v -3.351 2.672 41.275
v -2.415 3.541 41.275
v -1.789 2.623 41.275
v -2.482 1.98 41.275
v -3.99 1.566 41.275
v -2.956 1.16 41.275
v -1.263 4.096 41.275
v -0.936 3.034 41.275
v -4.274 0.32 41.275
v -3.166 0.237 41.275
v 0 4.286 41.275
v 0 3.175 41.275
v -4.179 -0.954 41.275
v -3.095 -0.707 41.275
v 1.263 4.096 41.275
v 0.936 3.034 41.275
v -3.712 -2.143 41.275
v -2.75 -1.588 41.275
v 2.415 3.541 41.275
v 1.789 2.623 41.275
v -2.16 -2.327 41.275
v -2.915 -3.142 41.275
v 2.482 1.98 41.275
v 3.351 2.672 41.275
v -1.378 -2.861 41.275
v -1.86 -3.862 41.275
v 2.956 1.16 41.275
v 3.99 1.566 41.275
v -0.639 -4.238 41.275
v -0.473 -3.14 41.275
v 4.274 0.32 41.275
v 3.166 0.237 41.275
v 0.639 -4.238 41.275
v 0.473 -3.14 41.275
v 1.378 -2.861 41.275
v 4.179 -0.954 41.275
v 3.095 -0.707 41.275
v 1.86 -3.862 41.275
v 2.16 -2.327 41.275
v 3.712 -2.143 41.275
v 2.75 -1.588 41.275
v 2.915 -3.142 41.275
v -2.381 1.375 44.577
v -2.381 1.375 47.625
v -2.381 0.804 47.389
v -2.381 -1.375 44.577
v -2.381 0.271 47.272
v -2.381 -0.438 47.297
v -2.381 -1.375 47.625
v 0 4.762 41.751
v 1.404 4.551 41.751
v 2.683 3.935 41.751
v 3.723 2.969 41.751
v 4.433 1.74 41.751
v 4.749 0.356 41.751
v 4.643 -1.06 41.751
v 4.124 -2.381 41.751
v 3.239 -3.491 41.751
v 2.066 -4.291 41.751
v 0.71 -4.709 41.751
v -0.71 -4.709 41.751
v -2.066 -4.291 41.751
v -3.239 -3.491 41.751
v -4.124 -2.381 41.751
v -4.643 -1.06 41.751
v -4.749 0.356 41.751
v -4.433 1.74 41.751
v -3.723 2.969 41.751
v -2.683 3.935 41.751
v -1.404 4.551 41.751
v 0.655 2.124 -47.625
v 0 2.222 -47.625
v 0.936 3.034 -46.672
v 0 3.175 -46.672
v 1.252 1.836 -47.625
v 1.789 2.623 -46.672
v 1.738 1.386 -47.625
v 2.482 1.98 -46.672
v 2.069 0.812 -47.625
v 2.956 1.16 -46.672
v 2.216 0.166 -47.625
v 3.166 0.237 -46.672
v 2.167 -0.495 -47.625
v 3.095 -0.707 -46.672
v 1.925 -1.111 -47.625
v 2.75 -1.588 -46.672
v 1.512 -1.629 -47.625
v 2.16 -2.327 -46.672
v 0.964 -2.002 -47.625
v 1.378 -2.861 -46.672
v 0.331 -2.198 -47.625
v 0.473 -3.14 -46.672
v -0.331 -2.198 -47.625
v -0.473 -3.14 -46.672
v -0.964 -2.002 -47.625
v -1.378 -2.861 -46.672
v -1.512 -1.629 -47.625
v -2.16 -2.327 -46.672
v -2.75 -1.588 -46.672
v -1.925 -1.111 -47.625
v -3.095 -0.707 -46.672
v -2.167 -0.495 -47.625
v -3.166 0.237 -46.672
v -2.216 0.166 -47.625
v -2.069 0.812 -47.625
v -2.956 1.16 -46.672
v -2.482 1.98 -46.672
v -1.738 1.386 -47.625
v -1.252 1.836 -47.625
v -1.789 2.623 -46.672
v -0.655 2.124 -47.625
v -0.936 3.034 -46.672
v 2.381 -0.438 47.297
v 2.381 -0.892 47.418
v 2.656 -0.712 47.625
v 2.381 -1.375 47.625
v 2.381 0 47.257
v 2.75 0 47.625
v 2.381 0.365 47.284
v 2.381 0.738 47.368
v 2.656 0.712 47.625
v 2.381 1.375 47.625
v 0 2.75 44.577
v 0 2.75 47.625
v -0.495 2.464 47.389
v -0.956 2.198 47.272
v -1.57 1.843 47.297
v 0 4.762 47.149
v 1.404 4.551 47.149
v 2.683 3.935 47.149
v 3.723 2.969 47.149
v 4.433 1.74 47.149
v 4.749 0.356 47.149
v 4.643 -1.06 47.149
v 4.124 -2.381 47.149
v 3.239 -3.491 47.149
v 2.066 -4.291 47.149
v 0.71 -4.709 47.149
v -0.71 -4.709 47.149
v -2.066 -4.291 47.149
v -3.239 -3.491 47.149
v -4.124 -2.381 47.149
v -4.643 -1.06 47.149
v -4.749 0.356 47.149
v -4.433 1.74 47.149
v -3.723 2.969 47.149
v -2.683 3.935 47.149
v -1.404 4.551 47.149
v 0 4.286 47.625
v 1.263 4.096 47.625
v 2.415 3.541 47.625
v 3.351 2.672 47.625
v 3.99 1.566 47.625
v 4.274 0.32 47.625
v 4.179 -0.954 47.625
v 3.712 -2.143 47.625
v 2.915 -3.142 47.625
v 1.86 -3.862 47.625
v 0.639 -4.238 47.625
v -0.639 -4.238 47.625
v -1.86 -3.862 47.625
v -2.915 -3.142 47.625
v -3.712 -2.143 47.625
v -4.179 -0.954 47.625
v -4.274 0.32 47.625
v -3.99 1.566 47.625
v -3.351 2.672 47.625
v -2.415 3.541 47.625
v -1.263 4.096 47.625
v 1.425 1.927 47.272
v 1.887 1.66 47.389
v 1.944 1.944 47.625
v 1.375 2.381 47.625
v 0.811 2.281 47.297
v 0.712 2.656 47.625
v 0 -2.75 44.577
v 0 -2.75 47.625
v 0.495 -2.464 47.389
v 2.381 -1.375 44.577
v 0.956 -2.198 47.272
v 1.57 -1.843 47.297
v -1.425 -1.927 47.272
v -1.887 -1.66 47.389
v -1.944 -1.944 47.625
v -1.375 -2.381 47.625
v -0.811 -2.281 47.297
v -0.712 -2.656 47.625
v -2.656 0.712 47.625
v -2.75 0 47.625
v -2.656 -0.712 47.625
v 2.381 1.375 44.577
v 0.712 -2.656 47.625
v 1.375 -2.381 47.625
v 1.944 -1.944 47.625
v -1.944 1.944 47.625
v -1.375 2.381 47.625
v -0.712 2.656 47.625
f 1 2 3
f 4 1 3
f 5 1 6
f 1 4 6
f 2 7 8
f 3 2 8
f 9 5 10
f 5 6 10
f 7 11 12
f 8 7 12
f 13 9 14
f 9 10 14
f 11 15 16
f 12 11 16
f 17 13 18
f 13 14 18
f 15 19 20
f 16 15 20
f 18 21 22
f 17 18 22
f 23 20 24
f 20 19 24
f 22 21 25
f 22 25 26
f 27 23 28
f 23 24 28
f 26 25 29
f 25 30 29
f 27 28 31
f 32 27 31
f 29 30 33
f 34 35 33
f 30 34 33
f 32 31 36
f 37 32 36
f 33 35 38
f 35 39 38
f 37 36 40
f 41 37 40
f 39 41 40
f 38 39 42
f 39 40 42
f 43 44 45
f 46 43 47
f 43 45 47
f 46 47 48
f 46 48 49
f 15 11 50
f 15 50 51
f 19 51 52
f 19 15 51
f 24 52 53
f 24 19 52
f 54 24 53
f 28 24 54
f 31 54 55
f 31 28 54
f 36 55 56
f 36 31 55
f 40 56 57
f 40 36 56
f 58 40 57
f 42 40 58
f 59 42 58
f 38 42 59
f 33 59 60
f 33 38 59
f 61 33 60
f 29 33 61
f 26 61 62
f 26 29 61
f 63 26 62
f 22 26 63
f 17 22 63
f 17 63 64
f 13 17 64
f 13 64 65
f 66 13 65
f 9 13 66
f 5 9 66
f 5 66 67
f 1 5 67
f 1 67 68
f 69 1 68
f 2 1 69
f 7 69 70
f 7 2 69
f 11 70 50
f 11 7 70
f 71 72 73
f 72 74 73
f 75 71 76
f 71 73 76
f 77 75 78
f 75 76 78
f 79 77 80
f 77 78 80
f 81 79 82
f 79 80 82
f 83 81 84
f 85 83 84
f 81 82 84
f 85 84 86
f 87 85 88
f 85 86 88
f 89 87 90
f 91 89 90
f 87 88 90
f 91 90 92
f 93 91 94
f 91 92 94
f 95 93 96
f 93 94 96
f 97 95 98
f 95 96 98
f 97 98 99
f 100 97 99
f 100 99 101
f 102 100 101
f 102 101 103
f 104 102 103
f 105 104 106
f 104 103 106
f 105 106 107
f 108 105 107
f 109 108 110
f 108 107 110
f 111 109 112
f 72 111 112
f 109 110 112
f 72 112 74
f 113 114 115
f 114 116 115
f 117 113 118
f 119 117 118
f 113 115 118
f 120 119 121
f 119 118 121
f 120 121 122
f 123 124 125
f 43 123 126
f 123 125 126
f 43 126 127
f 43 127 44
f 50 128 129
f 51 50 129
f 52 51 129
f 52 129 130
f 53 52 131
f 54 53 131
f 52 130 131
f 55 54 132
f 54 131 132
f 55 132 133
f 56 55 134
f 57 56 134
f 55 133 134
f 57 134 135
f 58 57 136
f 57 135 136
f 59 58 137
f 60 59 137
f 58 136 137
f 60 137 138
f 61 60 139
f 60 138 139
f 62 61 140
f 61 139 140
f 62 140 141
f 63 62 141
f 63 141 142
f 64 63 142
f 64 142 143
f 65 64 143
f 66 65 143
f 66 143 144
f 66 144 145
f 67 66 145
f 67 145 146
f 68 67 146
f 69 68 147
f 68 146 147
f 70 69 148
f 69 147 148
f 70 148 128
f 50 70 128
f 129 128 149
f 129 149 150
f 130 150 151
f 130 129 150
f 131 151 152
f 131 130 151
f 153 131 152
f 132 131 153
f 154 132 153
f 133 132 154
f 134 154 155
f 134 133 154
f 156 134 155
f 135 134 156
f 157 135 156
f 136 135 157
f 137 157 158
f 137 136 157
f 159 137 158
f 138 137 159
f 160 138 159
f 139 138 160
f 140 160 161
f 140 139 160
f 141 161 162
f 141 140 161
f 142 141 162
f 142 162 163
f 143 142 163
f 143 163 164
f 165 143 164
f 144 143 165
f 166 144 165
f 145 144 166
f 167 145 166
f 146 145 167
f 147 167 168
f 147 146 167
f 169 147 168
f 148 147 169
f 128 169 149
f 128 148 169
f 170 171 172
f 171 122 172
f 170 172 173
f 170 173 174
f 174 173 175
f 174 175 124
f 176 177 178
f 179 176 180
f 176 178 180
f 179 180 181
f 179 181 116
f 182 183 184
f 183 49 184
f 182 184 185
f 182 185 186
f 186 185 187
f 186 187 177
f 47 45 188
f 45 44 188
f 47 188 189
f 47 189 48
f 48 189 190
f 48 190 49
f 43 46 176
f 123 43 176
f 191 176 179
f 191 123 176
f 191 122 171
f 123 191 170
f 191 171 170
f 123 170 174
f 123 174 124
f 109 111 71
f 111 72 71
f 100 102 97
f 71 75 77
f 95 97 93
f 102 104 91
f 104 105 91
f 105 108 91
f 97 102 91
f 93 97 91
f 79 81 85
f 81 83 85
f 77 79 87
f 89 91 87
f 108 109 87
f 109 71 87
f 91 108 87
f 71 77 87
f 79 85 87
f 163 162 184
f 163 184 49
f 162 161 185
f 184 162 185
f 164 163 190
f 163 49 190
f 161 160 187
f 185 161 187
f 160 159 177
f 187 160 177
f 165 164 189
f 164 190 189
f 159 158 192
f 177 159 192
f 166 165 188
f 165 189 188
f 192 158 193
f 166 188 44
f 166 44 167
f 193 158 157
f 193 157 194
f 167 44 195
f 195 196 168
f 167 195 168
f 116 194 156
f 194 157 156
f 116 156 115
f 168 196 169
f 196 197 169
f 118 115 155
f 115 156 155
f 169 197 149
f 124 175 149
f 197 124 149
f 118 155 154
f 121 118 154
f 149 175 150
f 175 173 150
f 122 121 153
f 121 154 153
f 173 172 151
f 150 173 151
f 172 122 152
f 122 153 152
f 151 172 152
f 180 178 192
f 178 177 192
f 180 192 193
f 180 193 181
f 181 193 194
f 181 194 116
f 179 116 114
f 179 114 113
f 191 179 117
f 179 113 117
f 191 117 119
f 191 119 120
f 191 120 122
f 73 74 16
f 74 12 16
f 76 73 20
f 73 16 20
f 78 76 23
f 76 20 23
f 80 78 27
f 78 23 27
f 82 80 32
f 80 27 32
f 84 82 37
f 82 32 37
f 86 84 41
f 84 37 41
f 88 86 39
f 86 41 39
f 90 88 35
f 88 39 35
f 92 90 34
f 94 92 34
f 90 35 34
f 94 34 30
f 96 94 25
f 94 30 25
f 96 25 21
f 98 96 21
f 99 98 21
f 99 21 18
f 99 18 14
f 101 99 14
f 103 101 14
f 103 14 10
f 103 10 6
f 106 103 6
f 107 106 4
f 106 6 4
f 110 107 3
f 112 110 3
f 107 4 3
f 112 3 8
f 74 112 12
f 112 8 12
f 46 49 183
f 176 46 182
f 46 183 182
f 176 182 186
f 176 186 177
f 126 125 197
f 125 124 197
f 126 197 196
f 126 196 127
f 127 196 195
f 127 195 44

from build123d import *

# Parameters (mm, degrees)
CUT_EXTRUDE1_DEPTH = 3.048
SKETCH5_R          = 2.749630657
CUT_EXTRUDE2_DEPTH = 3.048
CUT_EXTRUDE2_DRAFT = -45
CHAMFER1_SIZE      = 0.47625


with BuildPart() as part:
    # Sketch3 → Revolve1 (revolve)
    with BuildSketch(Plane(origin=(0, 0, 0), x_dir=(0, 0, -1), z_dir=(1, 0, 0))):
        Polygon((-47.625, 4.7625), (-47.625, 2.38125), (-44.577, 2.38125), (-44.577, 0), (47.625, 0), (47.625, 2.2225), (46.6725, 3.175), (-41.275, 3.175), (-41.275, 4.7625), align=None)
    revolve(axis=Axis((0, 0, 47.625), (0, 0, -1)))

    # Sketch4 → Cut-Extrude1 (cut)
    with BuildSketch(Plane.XY.offset(47.625)):
        Polygon((0, 2.749630657), (-2.38125, 1.374815329), (-2.38125, -1.374815329), (0, -2.749630657), (2.38125, -1.374815329), (2.38125, 1.374815329), align=None)
    extrude(amount=-CUT_EXTRUDE1_DEPTH, mode=Mode.SUBTRACT)


with BuildPart() as cut_extrude2_tool:
    # Sketch5 → Cut-Extrude2 (with draft: the straight prism first)
    with BuildSketch(Plane.XY.offset(47.625)):
        Circle(SKETCH5_R)
    extrude(amount=-CUT_EXTRUDE2_DEPTH)
    # Cut-Extrude2: the draft: its side faces are tilted about the plane it starts from
    cut_extrude2_sides = [cut_extrude2_tool.faces().sort_by_distance(p)[0] for p in [
        (-2.749630657, 0, 46.101),
    ]]
    draft(cut_extrude2_sides, Plane.XY.offset(47.625), CUT_EXTRUDE2_DRAFT)


with BuildPart() as part_1:
    add(part.part)

    # Cut-Extrude2: cut by cut_extrude2_tool
    add(cut_extrude2_tool.part, mode=Mode.SUBTRACT)

    # Chamfer1
    chamfer1_edges = [part_1.edges().sort_by_distance(p)[0] for p in [
        (0, -4.7625, 47.625),
        (0, -4.7625, 41.275),
    ]]
    chamfer(chamfer1_edges, length=CHAMFER1_SIZE)


solid = part_1.part
